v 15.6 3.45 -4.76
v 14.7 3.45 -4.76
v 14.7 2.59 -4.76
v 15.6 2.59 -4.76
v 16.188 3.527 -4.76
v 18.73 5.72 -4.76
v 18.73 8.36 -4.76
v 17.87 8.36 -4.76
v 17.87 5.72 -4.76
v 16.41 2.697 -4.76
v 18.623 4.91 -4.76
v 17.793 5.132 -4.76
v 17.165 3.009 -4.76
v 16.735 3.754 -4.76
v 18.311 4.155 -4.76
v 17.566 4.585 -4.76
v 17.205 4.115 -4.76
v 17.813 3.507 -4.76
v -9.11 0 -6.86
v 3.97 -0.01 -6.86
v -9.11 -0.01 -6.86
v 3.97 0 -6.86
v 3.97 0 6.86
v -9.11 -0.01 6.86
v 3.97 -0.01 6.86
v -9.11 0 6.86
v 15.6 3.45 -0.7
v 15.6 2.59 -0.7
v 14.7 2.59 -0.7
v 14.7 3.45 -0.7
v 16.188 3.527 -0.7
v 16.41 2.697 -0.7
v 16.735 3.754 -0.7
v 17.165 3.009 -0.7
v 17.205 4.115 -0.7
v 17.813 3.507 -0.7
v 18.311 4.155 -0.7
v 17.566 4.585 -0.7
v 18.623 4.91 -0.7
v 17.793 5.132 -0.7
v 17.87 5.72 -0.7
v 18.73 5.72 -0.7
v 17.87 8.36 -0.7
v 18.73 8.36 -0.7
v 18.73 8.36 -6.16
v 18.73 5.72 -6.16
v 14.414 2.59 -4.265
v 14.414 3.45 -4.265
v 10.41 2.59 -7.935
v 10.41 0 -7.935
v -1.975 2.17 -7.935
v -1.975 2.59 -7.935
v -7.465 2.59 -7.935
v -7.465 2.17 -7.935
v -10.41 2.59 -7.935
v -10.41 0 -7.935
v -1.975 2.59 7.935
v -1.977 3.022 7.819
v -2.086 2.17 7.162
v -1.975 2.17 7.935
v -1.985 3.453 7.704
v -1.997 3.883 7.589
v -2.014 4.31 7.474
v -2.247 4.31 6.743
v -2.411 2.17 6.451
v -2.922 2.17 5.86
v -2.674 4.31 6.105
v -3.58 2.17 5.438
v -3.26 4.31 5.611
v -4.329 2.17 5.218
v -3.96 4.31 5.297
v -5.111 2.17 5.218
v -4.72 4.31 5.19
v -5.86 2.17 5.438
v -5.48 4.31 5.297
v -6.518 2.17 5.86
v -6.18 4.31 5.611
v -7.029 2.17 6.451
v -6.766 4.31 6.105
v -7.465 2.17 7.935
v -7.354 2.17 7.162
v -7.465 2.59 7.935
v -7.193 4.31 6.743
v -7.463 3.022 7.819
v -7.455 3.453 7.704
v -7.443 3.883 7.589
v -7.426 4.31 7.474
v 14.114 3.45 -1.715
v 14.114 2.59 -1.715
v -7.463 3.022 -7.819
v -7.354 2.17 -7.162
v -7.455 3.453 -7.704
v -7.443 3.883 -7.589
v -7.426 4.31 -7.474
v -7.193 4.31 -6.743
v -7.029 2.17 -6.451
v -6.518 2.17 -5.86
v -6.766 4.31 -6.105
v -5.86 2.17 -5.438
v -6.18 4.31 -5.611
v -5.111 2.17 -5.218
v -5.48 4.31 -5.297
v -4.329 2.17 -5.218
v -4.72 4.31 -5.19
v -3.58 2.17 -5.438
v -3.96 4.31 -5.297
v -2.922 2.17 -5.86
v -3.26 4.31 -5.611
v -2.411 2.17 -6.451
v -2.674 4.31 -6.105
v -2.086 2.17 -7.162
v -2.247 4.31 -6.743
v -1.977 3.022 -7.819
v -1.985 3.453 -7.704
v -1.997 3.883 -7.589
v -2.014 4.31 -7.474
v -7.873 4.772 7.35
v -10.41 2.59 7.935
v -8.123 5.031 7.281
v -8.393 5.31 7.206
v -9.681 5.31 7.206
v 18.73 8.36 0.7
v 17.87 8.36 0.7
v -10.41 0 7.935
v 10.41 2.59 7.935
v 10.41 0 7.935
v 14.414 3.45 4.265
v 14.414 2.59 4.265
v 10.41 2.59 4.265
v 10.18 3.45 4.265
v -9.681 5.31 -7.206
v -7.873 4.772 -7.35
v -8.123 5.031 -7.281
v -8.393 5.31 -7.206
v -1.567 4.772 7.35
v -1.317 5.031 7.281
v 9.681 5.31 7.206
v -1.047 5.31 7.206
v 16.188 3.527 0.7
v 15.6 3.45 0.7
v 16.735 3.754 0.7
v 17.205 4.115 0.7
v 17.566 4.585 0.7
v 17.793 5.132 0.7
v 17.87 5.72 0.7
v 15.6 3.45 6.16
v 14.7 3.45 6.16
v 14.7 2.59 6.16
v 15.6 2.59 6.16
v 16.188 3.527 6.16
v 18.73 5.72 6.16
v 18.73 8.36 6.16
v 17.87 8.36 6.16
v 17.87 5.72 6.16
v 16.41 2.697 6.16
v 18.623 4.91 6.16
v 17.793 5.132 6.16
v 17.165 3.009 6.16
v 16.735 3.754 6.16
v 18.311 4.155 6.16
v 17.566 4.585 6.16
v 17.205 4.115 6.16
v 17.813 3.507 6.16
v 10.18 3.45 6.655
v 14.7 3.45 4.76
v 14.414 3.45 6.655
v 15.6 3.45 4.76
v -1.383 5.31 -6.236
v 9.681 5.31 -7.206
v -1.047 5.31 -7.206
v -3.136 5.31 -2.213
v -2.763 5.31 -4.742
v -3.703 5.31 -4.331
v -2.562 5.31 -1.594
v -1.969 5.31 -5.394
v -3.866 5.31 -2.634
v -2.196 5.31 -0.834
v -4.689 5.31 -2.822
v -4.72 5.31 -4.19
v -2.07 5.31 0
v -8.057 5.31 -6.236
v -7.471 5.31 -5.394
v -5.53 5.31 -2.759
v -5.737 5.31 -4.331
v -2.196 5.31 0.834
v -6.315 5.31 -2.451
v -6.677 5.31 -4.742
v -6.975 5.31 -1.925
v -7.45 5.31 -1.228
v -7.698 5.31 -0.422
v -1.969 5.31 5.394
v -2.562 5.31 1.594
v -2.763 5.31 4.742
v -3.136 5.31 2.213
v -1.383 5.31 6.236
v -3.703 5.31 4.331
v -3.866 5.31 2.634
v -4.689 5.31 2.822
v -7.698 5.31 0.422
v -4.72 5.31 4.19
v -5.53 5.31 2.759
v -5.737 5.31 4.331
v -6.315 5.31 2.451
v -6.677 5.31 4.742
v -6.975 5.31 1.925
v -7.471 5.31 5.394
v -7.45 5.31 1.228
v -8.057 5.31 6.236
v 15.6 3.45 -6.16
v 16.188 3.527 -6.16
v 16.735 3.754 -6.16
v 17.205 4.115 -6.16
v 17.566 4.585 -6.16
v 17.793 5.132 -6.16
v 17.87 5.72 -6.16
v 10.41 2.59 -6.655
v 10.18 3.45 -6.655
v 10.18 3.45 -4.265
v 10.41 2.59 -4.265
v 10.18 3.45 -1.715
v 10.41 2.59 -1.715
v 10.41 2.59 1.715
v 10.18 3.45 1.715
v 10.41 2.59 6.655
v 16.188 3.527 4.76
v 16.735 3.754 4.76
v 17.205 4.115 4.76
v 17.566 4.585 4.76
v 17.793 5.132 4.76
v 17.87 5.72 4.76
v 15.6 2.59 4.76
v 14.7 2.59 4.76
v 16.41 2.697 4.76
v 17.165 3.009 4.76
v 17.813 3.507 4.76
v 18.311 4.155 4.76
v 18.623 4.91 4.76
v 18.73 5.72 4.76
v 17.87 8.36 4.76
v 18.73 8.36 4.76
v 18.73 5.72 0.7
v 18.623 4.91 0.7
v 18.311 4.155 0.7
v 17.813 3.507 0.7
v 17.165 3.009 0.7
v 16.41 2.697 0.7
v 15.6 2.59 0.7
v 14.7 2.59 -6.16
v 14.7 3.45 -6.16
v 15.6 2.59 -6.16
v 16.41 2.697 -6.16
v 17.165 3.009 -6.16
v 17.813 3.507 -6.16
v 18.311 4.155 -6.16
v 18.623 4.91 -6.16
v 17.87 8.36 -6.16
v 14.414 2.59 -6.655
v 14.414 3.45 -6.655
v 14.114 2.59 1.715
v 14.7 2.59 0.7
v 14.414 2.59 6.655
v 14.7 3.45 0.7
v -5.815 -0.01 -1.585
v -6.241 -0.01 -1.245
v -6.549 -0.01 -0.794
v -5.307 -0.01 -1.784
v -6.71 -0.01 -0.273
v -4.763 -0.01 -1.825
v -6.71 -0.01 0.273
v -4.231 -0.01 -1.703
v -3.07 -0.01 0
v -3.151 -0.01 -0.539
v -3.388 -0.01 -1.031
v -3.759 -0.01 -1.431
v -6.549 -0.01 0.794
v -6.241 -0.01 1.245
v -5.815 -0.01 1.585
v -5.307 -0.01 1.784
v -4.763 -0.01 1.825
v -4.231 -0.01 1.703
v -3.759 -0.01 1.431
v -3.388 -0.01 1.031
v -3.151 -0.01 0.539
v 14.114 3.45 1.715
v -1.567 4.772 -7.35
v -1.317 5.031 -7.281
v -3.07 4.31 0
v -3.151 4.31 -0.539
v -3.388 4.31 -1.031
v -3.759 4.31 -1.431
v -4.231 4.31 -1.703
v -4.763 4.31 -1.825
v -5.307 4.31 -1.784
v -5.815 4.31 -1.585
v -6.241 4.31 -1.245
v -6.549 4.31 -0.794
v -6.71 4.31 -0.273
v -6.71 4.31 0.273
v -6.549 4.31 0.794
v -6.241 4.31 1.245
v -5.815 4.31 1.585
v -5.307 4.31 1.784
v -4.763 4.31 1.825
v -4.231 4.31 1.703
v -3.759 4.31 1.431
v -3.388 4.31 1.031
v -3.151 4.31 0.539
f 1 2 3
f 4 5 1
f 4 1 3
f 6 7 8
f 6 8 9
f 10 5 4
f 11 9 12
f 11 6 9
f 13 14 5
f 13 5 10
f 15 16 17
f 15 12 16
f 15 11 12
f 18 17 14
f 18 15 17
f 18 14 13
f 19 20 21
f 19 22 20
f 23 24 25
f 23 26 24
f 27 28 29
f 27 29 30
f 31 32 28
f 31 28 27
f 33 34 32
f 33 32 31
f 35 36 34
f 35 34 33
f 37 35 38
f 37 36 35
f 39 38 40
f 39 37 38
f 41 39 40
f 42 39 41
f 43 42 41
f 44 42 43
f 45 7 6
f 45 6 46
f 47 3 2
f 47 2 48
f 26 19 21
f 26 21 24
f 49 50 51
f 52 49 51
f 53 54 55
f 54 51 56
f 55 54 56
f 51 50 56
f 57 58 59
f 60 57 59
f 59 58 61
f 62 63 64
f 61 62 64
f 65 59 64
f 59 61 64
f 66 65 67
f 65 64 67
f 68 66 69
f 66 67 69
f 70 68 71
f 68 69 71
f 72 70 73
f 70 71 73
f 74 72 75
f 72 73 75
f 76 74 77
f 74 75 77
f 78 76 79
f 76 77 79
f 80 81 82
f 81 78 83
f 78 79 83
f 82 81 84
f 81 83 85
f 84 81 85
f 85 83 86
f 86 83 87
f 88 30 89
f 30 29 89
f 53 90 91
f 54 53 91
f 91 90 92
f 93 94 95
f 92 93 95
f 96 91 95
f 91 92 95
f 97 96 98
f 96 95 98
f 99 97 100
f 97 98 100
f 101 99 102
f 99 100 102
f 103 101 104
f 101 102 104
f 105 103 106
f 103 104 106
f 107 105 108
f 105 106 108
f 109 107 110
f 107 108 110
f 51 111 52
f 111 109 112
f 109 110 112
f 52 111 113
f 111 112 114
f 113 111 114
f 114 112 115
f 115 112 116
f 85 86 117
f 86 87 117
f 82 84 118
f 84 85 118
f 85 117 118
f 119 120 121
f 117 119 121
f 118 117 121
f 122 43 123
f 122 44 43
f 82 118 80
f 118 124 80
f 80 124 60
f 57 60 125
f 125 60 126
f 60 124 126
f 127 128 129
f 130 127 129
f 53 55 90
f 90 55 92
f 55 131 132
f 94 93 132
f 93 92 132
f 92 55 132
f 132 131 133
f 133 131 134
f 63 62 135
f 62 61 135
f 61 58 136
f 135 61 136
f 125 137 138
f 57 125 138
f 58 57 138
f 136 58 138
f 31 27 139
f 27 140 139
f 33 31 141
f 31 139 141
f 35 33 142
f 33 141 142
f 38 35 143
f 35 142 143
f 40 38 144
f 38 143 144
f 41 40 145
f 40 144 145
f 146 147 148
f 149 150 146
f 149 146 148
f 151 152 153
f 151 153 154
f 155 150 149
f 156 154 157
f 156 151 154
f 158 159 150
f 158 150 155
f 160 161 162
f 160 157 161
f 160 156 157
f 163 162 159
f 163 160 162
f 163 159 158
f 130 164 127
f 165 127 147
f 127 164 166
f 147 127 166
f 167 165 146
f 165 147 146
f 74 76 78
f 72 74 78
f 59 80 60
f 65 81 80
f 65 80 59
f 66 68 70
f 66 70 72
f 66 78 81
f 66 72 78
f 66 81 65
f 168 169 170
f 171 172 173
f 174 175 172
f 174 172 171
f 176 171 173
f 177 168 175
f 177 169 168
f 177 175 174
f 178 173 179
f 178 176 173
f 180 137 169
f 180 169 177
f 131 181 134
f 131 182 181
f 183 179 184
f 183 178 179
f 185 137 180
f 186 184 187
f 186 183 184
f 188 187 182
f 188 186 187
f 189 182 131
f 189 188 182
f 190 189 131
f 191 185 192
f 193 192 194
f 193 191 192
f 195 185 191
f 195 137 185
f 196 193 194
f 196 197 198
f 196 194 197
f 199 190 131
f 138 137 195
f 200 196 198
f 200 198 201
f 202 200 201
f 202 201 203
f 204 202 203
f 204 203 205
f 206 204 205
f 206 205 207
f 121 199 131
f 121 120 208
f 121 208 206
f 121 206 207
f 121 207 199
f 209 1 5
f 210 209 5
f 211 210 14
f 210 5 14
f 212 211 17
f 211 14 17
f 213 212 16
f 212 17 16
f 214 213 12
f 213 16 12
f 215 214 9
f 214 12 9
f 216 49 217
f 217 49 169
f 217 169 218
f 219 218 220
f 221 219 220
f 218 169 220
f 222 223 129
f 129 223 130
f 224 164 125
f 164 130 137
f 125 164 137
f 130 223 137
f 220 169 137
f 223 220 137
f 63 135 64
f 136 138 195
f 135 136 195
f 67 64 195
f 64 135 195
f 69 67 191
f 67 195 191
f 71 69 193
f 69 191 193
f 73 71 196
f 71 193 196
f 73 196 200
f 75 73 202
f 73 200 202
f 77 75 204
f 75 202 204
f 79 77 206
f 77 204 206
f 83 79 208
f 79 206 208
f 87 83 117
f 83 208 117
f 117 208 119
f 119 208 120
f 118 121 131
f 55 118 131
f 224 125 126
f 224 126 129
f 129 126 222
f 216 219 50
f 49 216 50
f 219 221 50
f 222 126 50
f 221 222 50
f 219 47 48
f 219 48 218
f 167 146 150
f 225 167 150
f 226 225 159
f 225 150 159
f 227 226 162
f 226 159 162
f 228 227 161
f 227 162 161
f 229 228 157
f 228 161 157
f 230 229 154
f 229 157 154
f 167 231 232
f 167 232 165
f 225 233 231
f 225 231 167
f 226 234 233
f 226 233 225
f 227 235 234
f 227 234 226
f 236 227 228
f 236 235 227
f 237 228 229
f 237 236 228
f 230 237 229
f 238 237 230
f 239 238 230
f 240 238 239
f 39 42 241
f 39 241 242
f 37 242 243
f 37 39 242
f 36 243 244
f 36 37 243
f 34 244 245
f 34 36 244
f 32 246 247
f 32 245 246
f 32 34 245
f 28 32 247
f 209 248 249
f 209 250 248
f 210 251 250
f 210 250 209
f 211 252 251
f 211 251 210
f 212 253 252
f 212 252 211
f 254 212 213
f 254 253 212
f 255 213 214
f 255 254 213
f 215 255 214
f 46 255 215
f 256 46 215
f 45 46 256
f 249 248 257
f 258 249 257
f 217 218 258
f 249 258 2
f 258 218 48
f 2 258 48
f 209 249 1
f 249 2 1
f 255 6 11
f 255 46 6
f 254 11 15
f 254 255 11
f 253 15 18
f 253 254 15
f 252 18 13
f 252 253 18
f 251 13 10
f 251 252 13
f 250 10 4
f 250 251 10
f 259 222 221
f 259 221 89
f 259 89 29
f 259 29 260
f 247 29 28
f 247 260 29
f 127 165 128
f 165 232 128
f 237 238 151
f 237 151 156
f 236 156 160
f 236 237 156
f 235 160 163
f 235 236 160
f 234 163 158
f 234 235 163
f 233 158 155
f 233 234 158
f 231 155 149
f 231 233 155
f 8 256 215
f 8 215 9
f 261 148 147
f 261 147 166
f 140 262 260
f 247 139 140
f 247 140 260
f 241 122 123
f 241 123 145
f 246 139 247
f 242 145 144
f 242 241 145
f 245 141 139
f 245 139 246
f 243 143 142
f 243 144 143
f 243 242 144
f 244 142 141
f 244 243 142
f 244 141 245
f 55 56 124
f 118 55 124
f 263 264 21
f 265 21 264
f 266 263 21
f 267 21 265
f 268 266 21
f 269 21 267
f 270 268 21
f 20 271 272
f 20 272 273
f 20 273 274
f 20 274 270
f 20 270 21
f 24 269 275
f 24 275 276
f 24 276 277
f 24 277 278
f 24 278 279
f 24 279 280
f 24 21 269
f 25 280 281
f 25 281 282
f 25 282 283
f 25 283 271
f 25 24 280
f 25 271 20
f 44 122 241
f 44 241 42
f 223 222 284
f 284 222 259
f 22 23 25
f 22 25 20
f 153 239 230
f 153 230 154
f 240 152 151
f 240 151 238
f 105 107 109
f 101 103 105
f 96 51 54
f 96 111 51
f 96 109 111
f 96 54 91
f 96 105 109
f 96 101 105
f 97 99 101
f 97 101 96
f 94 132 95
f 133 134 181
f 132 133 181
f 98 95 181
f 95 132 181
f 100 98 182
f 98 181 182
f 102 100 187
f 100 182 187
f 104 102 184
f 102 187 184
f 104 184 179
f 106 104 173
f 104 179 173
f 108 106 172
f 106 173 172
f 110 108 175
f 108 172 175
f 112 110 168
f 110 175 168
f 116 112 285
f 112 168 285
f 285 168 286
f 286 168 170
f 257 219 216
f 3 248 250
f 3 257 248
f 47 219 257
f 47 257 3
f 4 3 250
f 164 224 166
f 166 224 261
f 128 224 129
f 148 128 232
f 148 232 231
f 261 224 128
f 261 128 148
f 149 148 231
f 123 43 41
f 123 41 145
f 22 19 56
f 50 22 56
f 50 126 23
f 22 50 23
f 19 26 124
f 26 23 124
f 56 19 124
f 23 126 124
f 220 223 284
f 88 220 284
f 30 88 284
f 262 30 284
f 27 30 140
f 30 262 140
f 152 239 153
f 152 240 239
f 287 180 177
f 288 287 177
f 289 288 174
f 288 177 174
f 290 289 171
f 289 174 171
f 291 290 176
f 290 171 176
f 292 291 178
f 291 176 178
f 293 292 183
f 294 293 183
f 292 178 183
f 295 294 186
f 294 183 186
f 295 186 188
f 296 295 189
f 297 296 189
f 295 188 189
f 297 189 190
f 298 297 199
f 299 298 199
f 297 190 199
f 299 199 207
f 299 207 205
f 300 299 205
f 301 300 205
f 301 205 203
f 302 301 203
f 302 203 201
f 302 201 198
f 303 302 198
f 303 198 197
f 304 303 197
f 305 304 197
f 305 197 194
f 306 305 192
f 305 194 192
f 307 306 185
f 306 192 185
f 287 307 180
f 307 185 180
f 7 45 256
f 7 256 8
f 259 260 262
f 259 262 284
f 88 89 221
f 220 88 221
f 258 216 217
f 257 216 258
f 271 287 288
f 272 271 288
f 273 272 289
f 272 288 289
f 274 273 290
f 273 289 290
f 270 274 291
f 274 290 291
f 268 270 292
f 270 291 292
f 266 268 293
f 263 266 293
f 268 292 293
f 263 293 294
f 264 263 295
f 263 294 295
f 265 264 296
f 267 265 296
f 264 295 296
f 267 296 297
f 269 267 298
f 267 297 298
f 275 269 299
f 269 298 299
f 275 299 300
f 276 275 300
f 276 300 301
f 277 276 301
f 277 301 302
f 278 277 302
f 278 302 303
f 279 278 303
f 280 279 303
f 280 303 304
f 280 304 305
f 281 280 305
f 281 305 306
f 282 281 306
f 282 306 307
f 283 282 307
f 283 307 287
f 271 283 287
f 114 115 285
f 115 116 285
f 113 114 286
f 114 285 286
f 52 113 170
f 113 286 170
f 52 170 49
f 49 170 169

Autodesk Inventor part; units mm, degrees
ref_plane "YZ Plane" through (0, 0, 0) normal (1, 0, 0) x (0, 1, 0)
ref_plane "XZ Plane" through (0, 0, 0) normal (0, 1, 0) x (-1, 0, 0)
sketch "Sketch1" plane through (0, 0, 0) normal (0, 1, 0) x (-1, 0, 0)
  line L0 (10.41, 7.935) -> (-10.41, 7.935)
  line L1 (-10.41, 7.935) -> (-10.41, -7.935)
  line L2 (-10.41, -7.935) -> (10.41, -7.935)
  line L3 (10.41, -7.935) -> (10.41, 7.935)
  point P0 (0, 0)
  dimension "d0" = 15.87
  dimension "d1" = 7.935
  dimension "d2" = 20.82
  dimension "d3" = 10.41
extrude "Extrusion1" add sketch "Sketch1" along normal blind 5.31
chamfer "Chamfer1" distance 2.72 angle 15 1 edges at (0, 5.31, 7.935) measured on face at (-3.47, 1.77, 7.935)
chamfer "Chamfer2" distance 2.72 angle 15 1 edges at (10.41, 5.31, -0.3644) measured on face at (10.41, 3.54, -2.8879)
chamfer "Chamfer3" distance 2.72 angle 15 1 edges at (-0.3644, 5.31, -7.935) measured on face at (3.2271, 1.77, -7.935)
chamfer "Chamfer4" distance 2.72 angle 15 1 edges at (-10.41, 5.31, 0) measured on face at (-10.41, 3.4967, -2.4021)
sketch "Sketch3" plane through (0, 0, 0) normal (0, -1, 0) x (1, 0, 0)
  line L0 (-9.11, 6.86) -> (3.97, 6.86)
  line L1 (3.97, 6.86) -> (3.97, -6.86)
  line L2 (3.97, -6.86) -> (-9.11, -6.86)
  line L3 (-9.11, -6.86) -> (-9.11, 6.86)
  line L4 (-10.41, -7.935) -> (-10.41, 7.935) projected
  point P0 (0, 0)
  dimension "d20" = 13.08
  dimension "d21" = 13.72
  dimension "d22" = 6.86
  dimension "d23" = 1.3
extrude "Extrusion2" add sketch "Sketch3" along normal blind 0.01
sketch "Sketch2" plane through (0, 5.31, 0) normal (0, 1, 0) x (1, 0, 0)
  circle A0 centre (-4.9, 0) radius 1.83
  line L0 (-10.41, 7.935) -> (-10.41, -7.935) projected
  point P0 (0, 0)
  dimension "d18" = 5.51
  dimension "d19" = 3.66
extrude "Extrusion3" cut sketch "Sketch2" against normal through all
sketch "Sketch4" plane through (0, 5.31, 0) normal (0, 1, 0) x (1, 0, 0)
  line L0 (-10.41, 7.935) -> (-10.41, -7.935) projected
  line L1 (-10.41, -7.935) -> (10.41, -7.935) projected
  line L2 (-9.3708, -7.935) -> (-0.6355, -7.935)
  circle A0 centre (-4.72, -7.935) radius 2.745
  point P0 (0, 0)
  dimension "d30" = 5.49
  dimension "d31" = 5.69
extrude "Extrusion4" cut sketch "Sketch4" against normal blind 3.14
mirror "Mirror1" about plane through (0, 0, 0) normal (0, 0, 1) of "Extrusion4"
chamfer "Chamfer5" distance 1 angle 45 3 edges at (-4.72, 5.31, 5.19) (-6.73, 5.31, 0) (-4.72, 5.31, -5.19)
ref_plane "Work Plane1" through (0, 2.59, 0) normal (0, -1, 0) x (1, 0, 0)
sketch "Sketch5" plane through (0, 2.59, 0) normal (0, -1, 0) x (1, 0, 0)
  line L0 (9.0645, 1.715) -> (14.7, 1.715)
  line L1 (14.7, 1.715) -> (14.7, -1.715)
  line L2 (14.7, -1.715) -> (9.0645, -1.715)
  line L3 (9.0645, -1.715) -> (9.0645, 1.715)
  line L4 (10.41, 7.935) -> (10.41, -7.935) projected
  line L5 (10.41, 0) -> (13.4225, 0)
  line L6 (10.1151, 6.655) -> (14.7, 6.655)
  line L7 (14.7, 6.655) -> (14.7, 4.265)
  line L8 (14.7, 4.265) -> (10.1151, 4.265)
  line L9 (10.1151, 4.265) -> (10.1151, 6.655)
  line L10 (14.7, 5.46) -> (14.8506, 5.46)
  line L11 (14.7, 6.16) -> (14.4142, 6.655)
  line L12 (14.7, 4.76) -> (14.4142, 4.265)
  line L13 (14.7, 0.7) -> (14.114, 1.715)
  line L14 (14.7, -0.7) -> (14.114, -1.715)
  line L15 (10.1151, -6.655) -> (14.7, -6.655)
  line L16 (14.7, -6.655) -> (14.7, -4.265)
  line L17 (14.7, -4.265) -> (10.1151, -4.265)
  line L18 (10.1151, -4.265) -> (10.1151, -6.655)
  line L19 (14.7, -6.16) -> (14.4142, -6.655)
  line L20 (14.7, -4.76) -> (14.4142, -4.265)
  point P0 (0, 0)
  dimension "d38" = 3.43
  dimension "d39" = 1.715
  dimension "d40" = 4.29
  dimension "d41" = 0
  dimension "d42" = 2.39
  dimension "d43" = 5.46
  dimension "d44" = 1.4
  dimension "d45" = 0.7
  dimension "d46" = 1.4
  dimension "d47" = 0.7
  dimension "d48" = 30
  dimension "d49" = 30
  dimension "d50" = 30
  dimension "d51" = 30
extrude "Extrusion5" add sketch "Sketch5" against normal blind 0.86 contours L17 L20 L16 L19 L15 L4 | L4 L15 L18 L17 | L8 L9 L6 L4 | L4 L6 L11 L7 L12 L8 | L13 L1 L14 L2 L4 L0 | L4 L2 L3 L0
sketch "Sketch6" plane through (14.7, 2.59, 0.7) normal (1, 0, 0) x (0, 0, -1)
  line L0 (-5.46, 0) -> (-5.46, 0.86) projected
  line L1 (-4.06, 0) -> (-4.06, 0.86) projected
  line L2 (-5.46, 0) -> (-4.06, 0)
  line L3 (-4.06, 0) -> (-4.06, 0.86)
  line L4 (-4.06, 0.86) -> (-5.46, 0.86)
  line L5 (-5.46, 0.86) -> (-5.46, 0)
  line L6 (0, 0) -> (0, 0.86) projected
  line L7 (1.4, 0) -> (1.4, 0.86) projected
  line L8 (0, 0) -> (1.4, 0)
  line L9 (1.4, 0) -> (1.4, 0.86)
  line L10 (1.4, 0.86) -> (0, 0.86)
  line L11 (0, 0.86) -> (0, 0)
  line L12 (5.46, 0) -> (5.46, 0.86) projected
  line L13 (4.965, 0.86) -> (7.355, 0.86) projected
  line L14 (5.46, 0) -> (6.86, 0)
  line L15 (6.86, 0) -> (6.86, 0.86)
  line L16 (6.86, 0.86) -> (5.46, 0.86)
  line L17 (5.46, 0.86) -> (5.46, 0)
  point P0 (0.7, -2.59)
  dimension "d54" = 1.4
sketch "Sketch7" plane through (0, 0, 0) normal (0, 0, 1) x (1, 0, 0)
  line L0 (14.7, 2.59) -> (14.7, 3.45) projected
  line L1 (14.7, 3.02) -> (15.6, 3.02)
  line L2 (18.3, 5.72) -> (18.3, 8.36)
  line L3 (10.41, 0) -> (-10.41, 0) projected
  arc A0 (15.6, 3.02) -> (18.3, 5.72) centre (15.6, 5.72) ccw
  point P0 (0, 0)
  point P1 (18.3, 3.02)
  dimension "d55" = 8.36
  dimension "d56" = 3.6
  dimension "d57" = 2.7
sweep "Sweep1" add profiles "Sketch6" path "Sketch7" path curves L1 A0 L2
properties part number "TO-247-Underheat"
